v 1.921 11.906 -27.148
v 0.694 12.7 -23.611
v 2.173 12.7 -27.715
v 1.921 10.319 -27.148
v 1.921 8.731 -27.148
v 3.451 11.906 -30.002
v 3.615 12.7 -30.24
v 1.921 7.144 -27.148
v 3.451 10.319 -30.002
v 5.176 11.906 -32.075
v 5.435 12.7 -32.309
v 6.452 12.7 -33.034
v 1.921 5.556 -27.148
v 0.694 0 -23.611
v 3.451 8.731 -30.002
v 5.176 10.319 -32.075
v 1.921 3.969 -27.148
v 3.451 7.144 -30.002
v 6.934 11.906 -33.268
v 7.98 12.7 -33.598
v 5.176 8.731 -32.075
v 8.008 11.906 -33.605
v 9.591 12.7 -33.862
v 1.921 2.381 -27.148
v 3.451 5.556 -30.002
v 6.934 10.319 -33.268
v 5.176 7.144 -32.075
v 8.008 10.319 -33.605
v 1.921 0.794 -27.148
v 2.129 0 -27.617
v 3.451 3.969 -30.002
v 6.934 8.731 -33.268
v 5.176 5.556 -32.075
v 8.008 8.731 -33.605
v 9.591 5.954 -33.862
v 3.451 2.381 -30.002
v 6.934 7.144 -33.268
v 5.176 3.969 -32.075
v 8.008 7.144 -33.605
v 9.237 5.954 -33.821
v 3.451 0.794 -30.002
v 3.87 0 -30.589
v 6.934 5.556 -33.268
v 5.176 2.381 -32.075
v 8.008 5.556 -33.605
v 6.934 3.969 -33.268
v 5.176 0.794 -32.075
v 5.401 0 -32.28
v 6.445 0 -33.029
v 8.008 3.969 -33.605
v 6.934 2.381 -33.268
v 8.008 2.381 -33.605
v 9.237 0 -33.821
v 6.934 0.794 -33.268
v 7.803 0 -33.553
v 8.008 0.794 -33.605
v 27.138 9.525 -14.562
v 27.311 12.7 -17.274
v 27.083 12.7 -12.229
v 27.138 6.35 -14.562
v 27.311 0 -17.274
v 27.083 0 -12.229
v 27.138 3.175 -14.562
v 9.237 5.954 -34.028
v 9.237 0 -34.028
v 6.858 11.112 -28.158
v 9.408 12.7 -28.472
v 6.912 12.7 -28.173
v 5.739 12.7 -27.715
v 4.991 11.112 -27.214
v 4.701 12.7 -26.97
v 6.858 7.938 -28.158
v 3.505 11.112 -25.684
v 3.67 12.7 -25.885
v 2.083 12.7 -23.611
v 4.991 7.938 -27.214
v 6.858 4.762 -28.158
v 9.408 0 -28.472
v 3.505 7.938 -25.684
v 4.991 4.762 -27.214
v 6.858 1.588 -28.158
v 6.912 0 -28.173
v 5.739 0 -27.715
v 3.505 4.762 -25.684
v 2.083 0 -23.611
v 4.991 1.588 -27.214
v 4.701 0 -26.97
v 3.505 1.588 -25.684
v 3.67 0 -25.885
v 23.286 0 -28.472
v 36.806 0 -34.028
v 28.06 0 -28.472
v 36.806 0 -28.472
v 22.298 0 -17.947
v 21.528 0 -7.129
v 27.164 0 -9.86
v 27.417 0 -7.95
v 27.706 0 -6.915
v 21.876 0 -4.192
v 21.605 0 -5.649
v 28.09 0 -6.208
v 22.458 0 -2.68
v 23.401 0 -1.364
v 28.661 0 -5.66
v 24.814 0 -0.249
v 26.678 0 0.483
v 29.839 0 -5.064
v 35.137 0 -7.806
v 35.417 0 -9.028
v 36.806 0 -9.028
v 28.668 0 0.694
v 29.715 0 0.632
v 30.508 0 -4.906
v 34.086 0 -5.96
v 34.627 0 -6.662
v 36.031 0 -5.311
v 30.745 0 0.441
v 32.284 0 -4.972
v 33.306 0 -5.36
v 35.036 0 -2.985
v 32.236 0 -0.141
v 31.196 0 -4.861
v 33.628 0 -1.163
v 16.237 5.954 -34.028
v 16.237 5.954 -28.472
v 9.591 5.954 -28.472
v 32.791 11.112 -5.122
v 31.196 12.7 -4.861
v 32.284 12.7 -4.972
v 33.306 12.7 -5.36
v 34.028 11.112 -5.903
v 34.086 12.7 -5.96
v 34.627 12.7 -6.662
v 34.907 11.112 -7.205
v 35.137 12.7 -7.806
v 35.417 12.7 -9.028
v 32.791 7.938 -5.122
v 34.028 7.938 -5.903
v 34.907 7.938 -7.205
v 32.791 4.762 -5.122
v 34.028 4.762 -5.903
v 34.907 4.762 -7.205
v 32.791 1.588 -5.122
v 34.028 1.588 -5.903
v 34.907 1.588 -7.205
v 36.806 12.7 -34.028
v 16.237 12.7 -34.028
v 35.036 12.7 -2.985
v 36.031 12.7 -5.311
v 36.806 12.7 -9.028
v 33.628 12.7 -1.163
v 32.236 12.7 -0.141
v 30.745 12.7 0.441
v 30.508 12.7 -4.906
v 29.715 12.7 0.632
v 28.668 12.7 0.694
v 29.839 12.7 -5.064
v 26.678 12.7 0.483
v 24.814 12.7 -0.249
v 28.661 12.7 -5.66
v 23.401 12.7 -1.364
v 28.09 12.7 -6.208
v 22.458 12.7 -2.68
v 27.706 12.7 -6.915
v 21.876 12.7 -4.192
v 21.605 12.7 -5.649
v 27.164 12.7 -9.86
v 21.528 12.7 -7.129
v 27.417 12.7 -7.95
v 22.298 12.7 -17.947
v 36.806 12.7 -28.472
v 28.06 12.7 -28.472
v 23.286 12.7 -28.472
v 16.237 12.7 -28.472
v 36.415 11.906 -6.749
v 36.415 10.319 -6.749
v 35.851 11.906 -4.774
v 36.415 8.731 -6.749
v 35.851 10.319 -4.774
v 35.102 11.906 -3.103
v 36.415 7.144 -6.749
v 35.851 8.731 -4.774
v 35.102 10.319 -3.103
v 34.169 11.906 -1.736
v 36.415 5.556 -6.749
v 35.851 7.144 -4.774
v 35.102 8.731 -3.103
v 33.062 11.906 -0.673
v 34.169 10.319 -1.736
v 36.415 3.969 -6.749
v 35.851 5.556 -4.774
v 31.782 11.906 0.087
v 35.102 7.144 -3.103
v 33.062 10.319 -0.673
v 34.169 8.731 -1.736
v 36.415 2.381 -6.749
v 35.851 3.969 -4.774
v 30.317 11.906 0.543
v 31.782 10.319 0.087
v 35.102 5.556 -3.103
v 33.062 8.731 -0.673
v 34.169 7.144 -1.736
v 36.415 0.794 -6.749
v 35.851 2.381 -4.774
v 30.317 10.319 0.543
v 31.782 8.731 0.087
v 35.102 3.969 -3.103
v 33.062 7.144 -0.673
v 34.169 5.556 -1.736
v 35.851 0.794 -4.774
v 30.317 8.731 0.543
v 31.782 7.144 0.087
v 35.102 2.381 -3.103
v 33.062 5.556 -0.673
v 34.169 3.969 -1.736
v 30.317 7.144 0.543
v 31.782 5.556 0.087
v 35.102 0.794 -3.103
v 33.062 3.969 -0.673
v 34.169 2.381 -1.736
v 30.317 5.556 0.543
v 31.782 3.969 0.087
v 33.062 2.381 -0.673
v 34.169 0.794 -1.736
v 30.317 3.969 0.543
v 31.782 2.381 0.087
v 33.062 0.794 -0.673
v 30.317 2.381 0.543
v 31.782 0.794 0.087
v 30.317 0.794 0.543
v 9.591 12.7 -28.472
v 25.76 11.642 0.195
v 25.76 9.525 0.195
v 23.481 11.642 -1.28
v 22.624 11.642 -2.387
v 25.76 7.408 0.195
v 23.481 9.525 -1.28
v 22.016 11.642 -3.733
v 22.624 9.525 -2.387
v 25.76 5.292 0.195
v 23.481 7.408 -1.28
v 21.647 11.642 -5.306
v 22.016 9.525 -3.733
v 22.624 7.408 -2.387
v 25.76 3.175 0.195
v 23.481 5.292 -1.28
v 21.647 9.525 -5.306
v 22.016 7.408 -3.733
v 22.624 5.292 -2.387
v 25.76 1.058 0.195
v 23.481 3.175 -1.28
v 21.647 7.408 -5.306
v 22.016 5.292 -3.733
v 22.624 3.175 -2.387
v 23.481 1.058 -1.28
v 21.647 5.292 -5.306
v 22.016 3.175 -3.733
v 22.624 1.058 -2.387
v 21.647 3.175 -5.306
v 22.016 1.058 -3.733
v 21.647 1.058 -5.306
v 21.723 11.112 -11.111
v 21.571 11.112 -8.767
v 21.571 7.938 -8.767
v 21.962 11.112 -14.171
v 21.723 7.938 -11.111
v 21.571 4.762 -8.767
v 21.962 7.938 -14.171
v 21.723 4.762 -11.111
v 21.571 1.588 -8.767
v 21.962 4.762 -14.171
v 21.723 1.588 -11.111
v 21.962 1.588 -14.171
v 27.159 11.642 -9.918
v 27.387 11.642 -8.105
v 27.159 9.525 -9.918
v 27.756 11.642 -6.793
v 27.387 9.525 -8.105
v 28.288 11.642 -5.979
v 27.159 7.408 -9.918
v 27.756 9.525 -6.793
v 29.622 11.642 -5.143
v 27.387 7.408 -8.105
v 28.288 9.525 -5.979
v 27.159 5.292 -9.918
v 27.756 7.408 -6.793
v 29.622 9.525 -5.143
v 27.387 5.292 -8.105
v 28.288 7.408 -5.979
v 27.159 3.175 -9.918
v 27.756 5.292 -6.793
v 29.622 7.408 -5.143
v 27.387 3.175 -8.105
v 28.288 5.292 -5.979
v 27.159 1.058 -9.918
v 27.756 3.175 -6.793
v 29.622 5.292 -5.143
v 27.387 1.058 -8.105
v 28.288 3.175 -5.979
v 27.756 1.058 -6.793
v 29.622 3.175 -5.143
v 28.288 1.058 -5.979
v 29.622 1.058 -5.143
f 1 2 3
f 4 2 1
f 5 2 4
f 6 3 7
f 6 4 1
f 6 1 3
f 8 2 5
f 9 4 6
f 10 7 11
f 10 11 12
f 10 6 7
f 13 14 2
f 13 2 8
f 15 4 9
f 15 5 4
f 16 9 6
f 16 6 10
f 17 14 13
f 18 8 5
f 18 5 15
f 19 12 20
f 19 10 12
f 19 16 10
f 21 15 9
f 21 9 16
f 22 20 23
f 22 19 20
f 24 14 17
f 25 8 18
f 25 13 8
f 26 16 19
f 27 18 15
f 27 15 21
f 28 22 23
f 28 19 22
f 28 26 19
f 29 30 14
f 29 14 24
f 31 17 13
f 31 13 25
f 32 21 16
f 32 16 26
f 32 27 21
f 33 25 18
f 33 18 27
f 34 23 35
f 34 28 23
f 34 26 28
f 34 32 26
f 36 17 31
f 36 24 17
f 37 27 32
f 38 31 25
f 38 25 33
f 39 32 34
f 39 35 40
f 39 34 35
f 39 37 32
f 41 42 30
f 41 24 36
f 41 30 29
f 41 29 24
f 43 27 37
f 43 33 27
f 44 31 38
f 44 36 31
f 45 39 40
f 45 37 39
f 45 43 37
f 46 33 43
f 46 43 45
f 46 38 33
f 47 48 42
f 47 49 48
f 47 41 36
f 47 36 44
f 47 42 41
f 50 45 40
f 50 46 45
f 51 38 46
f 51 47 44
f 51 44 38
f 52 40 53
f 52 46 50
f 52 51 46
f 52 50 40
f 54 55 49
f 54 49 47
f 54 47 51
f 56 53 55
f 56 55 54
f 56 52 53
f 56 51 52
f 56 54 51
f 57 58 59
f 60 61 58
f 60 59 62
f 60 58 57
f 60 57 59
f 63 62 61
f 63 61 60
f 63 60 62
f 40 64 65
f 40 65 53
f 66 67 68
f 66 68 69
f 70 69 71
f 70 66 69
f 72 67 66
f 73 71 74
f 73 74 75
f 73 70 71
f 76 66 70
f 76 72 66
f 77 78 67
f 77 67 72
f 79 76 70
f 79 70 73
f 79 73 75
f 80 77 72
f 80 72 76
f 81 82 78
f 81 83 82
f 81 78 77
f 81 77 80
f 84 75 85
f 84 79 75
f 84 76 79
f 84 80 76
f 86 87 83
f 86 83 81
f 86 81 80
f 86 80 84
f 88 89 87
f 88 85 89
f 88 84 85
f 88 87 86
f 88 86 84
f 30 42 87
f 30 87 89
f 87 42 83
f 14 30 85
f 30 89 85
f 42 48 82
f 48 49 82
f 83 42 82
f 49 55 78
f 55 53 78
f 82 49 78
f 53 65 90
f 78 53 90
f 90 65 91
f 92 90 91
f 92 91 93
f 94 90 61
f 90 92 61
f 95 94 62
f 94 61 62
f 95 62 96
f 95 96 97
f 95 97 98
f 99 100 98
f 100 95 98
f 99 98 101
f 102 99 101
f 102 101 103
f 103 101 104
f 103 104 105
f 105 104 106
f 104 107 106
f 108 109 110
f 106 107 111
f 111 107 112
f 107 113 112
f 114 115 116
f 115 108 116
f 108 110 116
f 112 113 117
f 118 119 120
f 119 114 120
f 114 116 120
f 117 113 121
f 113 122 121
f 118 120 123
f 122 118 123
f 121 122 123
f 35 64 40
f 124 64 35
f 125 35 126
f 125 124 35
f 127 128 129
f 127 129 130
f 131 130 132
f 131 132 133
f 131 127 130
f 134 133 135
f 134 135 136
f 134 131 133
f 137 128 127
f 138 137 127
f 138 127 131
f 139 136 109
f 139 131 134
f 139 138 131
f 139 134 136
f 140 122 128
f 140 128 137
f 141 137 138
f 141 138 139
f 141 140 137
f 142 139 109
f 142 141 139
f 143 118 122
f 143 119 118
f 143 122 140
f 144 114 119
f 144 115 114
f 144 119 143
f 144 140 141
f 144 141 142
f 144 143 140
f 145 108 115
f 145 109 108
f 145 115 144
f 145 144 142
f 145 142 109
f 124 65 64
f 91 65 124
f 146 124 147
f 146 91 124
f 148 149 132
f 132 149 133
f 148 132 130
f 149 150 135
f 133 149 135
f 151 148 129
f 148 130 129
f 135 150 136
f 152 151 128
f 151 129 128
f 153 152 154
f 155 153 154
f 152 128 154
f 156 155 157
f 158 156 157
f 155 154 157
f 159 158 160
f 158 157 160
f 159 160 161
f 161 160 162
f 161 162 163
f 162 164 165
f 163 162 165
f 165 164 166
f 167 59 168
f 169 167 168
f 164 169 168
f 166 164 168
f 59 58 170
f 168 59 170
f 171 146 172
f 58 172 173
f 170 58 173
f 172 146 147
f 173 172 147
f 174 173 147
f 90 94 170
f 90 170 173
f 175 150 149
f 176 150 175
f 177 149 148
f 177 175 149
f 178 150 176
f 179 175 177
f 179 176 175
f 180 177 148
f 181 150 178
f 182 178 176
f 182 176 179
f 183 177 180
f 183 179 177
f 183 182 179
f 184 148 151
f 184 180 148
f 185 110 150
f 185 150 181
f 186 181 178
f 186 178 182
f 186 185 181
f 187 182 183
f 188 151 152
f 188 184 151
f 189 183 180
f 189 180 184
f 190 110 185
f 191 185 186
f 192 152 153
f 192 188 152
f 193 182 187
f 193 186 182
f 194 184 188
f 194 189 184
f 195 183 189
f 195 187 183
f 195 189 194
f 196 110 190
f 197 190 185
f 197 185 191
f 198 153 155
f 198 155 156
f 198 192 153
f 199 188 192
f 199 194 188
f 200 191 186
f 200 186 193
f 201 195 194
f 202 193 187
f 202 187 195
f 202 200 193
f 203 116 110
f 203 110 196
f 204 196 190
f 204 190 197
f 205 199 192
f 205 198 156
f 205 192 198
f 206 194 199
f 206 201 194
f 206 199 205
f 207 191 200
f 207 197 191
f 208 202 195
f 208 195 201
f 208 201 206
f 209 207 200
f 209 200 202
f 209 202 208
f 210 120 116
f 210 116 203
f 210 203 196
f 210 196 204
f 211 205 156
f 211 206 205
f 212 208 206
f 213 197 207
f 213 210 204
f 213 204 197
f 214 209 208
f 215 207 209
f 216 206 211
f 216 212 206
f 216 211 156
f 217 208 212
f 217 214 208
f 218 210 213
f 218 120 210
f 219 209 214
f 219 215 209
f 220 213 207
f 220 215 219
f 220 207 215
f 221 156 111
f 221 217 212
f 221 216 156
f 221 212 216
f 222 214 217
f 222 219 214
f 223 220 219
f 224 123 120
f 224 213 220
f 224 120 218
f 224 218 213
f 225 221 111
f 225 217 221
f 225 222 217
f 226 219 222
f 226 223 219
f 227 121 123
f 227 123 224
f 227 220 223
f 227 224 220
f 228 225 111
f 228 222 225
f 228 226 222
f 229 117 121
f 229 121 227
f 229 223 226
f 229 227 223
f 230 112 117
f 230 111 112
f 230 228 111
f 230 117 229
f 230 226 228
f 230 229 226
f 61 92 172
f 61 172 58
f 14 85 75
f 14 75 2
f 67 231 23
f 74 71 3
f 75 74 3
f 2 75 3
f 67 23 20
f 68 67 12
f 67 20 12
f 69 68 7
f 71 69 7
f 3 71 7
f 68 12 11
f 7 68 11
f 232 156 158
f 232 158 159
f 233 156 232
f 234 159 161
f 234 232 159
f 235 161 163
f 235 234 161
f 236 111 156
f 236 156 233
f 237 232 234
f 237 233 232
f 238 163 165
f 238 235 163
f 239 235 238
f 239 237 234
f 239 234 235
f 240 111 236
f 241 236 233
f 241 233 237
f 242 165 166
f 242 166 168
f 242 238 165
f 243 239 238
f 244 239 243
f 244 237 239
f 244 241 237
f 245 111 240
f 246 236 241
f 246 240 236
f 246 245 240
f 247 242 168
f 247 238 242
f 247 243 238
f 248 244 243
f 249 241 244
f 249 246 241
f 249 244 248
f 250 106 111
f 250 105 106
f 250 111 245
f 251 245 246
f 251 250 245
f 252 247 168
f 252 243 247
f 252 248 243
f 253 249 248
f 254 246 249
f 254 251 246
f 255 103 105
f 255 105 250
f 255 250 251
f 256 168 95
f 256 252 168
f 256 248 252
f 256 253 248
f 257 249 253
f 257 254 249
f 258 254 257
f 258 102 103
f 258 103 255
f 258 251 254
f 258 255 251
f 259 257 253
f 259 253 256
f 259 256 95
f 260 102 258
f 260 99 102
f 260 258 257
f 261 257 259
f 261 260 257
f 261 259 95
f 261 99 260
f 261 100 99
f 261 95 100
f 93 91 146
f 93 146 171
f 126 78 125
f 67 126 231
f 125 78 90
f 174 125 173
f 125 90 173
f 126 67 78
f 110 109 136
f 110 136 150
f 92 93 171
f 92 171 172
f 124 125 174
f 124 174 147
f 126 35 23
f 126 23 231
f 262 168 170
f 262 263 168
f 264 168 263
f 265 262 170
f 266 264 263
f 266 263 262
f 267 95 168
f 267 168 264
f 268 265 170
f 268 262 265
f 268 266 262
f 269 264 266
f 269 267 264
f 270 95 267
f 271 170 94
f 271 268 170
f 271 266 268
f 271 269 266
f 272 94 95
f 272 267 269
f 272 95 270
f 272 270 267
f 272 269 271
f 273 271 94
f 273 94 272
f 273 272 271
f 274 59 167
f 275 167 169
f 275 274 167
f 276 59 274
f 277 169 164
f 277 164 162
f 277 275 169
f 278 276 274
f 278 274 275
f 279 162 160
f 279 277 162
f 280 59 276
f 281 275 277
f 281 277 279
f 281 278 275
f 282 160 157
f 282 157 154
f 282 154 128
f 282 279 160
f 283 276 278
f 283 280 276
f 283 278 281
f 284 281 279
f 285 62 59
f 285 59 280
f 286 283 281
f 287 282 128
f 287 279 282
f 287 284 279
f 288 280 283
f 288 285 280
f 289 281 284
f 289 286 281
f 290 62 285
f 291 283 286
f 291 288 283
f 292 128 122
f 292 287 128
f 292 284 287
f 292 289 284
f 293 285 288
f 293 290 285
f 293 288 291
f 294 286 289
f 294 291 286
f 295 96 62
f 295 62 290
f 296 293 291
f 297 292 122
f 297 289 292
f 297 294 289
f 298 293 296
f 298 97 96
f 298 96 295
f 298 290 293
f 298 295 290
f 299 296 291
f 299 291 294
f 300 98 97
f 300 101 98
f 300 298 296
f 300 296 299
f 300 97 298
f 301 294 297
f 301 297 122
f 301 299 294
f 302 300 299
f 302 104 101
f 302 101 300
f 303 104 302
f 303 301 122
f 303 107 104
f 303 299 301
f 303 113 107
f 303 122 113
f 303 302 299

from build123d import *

# Parameters (mm, degrees)
BOSS_EXTRUDE1_DEPTH     = 12.7
CUT_EXTRUDE2_DEPTH      = 52.709076543
CUT_EXTRUDE2_DEPTH_BACK = 12.7
SKETCH4_W               = 5.555555556
SKETCH4_H               = 5.954243766
BOSS_EXTRUDE2_DEPTH     = 7


with BuildPart() as part:
    # Sketch2 → Boss-Extrude1 (new body)
    with BuildSketch(Plane(origin=(0, 0, 0), x_dir=(1, 0, 0), z_dir=(0, 1, 0))):
        with BuildLine():
            Line((36.805555556, 34.027777778), (36.805555556, 28.472222222))
            Line((36.805555556, 28.472222222), (28.059895833, 28.472222222))
            Line((28.059895833, 28.472222222), (27.311197917, 17.274305556))
            add(Edge.make_bspline(
                [(27.311197917, 17.274305556), (27.277795656, 16.804166639), (27.213581874, 15.900353642), (27.134284285, 14.591279231), (27.088344823, 13.379251723), (27.084956214, 12.601307574), (27.083333333, 12.228732639)],
                knots=[0, 0, 0, 0, 1.119532368, 2.152231754, 3.115062263, 4, 4, 4, 4], degree=3))
            add(Edge.make_bspline(
                [(27.083333333, 12.228732639), (27.088274581, 11.823604319), (27.097676522, 11.052747972), (27.1463749, 9.958919939), (27.245170271, 8.988755862), (27.371002693, 8.143926135), (27.529152233, 7.419430528), (27.728457334, 6.818301639), (27.97650636, 6.339464464), (28.352227221, 5.878445418), (28.902546694, 5.47047021), (29.612022333, 5.12581616), (30.381545964, 4.888099058), (30.919027092, 4.870283408), (31.195746528, 4.861111111)],
                knots=[0, 0, 0, 0, 1.508120221, 2.869569927, 4.073906796, 5.136392291, 6.047624064, 6.831039609, 7.487569696, 8.042672177, 9.031004047, 10.006413578, 10.97361213, 12, 12, 12, 12], degree=3))
            add(Edge.make_bspline(
                [(31.195746528, 4.861111111), (31.47916585, 4.872136088), (32.020929674, 4.893210634), (32.788220791, 5.094099051), (33.466107529, 5.423211567), (34.05259416, 5.891325855), (34.548953998, 6.488400226), (34.936220725, 7.22238631), (35.244986398, 8.076473761), (35.357486114, 8.699850181), (35.416666667, 9.027777778)],
                knots=[0, 0, 0, 0, 1.033647866, 1.975846305, 2.874029418, 3.767535477, 4.696297243, 5.689637366, 6.784632136, 8, 8, 8, 8], degree=3))
            Line((35.416666667, 9.027777778), (36.805555556, 9.027777778))
            add(Edge.make_bspline(
                [(36.805555556, 9.027777778), (36.751313392, 8.636593642), (36.645430641, 7.872987448), (36.430993277, 6.771079076), (36.1666915, 5.743505172), (35.873825885, 4.788096172), (35.503638642, 3.918308722), (35.126438428, 3.108890157), (34.67022236, 2.39005292), (34.190460036, 1.734735752), (33.64770155, 1.167708505), (33.078282467, 0.661363985), (32.447526517, 0.251271838), (31.785619175, -0.107880779), (31.064059185, -0.356214557), (30.308826122, -0.563500536), (29.502063403, -0.664205141), (28.949843487, -0.684214933), (28.667534722, -0.694444444)],
                knots=[0, 0, 0, 0, 1.346490984, 2.628401203, 3.824883511, 4.963792231, 6.031069444, 7.045970716, 8.004214277, 8.929182016, 9.810359102, 10.675861826, 11.520733207, 12.370272421, 13.236390006, 14.115839292, 15.03676947, 16, 16, 16, 16], degree=3))
            add(Edge.make_bspline(
                [(28.667534722, -0.694444444), (28.154682861, -0.675816782), (27.164131243, -0.639838242), (25.766335044, -0.242024901), (24.512145619, 0.369174112), (23.621609051, 1.101026149), (23.010255911, 1.797210882), (22.609852371, 2.383817061), (22.268478936, 3.030858971), (22.003101082, 3.740487332), (21.782965902, 4.501315843), (21.632459475, 5.322642072), (21.547875637, 6.204798769), (21.53462541, 6.814049436), (21.527777778, 7.12890625)],
                knots=[0, 0, 0, 0, 1.53176672, 2.958542455, 4.314758716, 5.68491526, 6.375705814, 7.084681483, 7.806528549, 8.560798466, 9.349284224, 10.175616502, 11.057170379, 12, 12, 12, 12], degree=3))
            add(Edge.make_bspline(
                [(21.527777778, 7.12890625), (21.530511411, 7.37125412), (21.536674087, 7.917600965), (21.569321673, 8.825873224), (21.639359606, 9.910585643), (21.725996598, 11.172904628), (21.834635018, 12.612456183), (21.96658957, 14.232690848), (22.114735136, 16.030968586), (22.235168036, 17.288909187), (22.298177083, 17.947048611)],
                knots=[0, 0, 0, 0, 0.536190643, 1.208783333, 2.010417809, 2.94084931, 4.00811323, 5.204264869, 6.537304937, 8, 8, 8, 8], degree=3))
            Line((22.298177083, 17.947048611), (23.285590278, 28.472222222))
            Line((23.285590278, 28.472222222), (15.277777778, 28.472222222))
            add(Edge.make_bspline(
                [(15.277777778, 28.472222222), (15.214460278, 27.401507925), (15.092072877, 25.331907254), (14.886109564, 22.340596723), (14.670777515, 19.573381685), (14.442846588, 17.030553937), (14.208342944, 14.71137929), (13.954506302, 12.617981517), (13.715610292, 10.74508508), (13.436521107, 9.086740026), (13.164846669, 7.602952782), (12.886850841, 6.270387957), (12.590238795, 5.07441313), (12.303899426, 4.011159992), (12.003972777, 3.085637953), (11.686744628, 2.301603715), (11.378814424, 1.642404725), (10.958043065, 0.964152103), (10.358101863, 0.292051075), (9.505081424, -0.285187523), (8.526340218, -0.641645855), (7.833640049, -0.676470824), (7.476128472, -0.694444444)],
                knots=[0, 0, 0, 0, 2.01044623, 3.886023449, 5.620111306, 7.212895615, 8.671360263, 9.989066837, 11.16552434, 12.209857215, 13.140654073, 13.99296191, 14.760845937, 15.449993852, 16.056713946, 16.582946555, 17.034739681, 17.418487115, 18.076100987, 18.706013306, 19.33215662, 20, 20, 20, 20], degree=3))
            add(Edge.make_bspline(
                [(7.476128472, -0.694444444), (7.207412809, -0.681627697), (6.681489385, -0.656543087), (5.927311086, -0.469815134), (5.234803565, -0.159026243), (4.623769653, 0.271526397), (4.10585267, 0.797998542), (3.737602188, 1.427988796), (3.515453468, 2.133829731), (3.486861324, 2.631486012), (3.472222222, 2.886284722)],
                knots=[0, 0, 0, 0, 1.073515936, 2.101057932, 3.084730514, 4.091615775, 5.073373561, 6.013242394, 6.982785322, 8, 8, 8, 8], degree=3))
            add(Edge.make_bspline(
                [(3.472222222, 2.886284722), (3.49977796, 3.167601475), (3.56174898, 3.800264126), (3.975195909, 4.785596558), (4.58793497, 5.912424554), (5.130000946, 6.671771181), (5.425347222, 7.085503472)],
                knots=[0, 0, 0, 0, 0.719350384, 1.617771125, 2.702035439, 4, 4, 4, 4], degree=3))
            add(Edge.make_bspline(
                [(5.425347222, 7.085503472), (5.880890291, 7.733268934), (6.778468477, 9.009592048), (7.924062056, 11.019134082), (8.912809694, 13.051591024), (9.583491505, 14.814505434), (10.052627408, 16.316401679), (10.355193153, 17.603017915), (10.666713374, 19.033013262), (10.926646603, 20.624922957), (11.194761694, 22.366552488), (11.410609585, 24.268277428), (11.637107009, 26.317618199), (11.748122743, 27.737606389), (11.805555556, 28.472222222)],
                knots=[0, 0, 0, 0, 1.256859471, 2.476450027, 3.668368903, 4.842737386, 5.467680022, 6.165560467, 6.940549266, 7.791280764, 8.726175375, 9.738470097, 10.830021485, 12, 12, 12, 12], degree=3))
            Line((11.805555556, 28.472222222), (9.407552083, 28.472222222))
            add(Edge.make_bspline(
                [(9.407552083, 28.472222222), (8.954085196, 28.460620671), (8.094301289, 28.438623856), (6.890732805, 28.196638527), (5.842130851, 27.81794011), (4.969568852, 27.229936528), (4.197964836, 26.514921386), (3.47646424, 25.663099106), (2.739413588, 24.704465568), (2.307624449, 23.984891132), (2.083333333, 23.611111111)],
                knots=[0, 0, 0, 0, 1.164670171, 2.208242094, 3.144640406, 4.011598175, 4.893941805, 5.843464191, 6.879796223, 8, 8, 8, 8], degree=3))
            Line((2.083333333, 23.611111111), (0.694444444, 23.611111111))
            add(Edge.make_bspline(
                [(0.694444444, 23.611111111), (0.877085401, 24.232597394), (1.229291, 25.431074191), (1.886266978, 27.119888333), (2.60411942, 28.642568556), (3.40397479, 29.980706486), (4.259111756, 31.115981615), (5.118517845, 32.058955597), (5.996672541, 32.785861584), (6.772590288, 33.224850634), (7.449074281, 33.455523285), (8.027104125, 33.619326955), (8.696031334, 33.743397524), (9.444623844, 33.855790163), (10.28602055, 33.921881494), (11.211287579, 33.993942488), (12.22496831, 34.020966417), (12.926797761, 34.025446099), (13.292100694, 34.027777778)],
                knots=[0, 0, 0, 0, 1.702237036, 3.282601159, 4.758360036, 6.123233304, 7.372634412, 8.489452943, 9.469553166, 10.358928799, 10.813046741, 11.345939706, 11.937066667, 12.599998432, 13.335161994, 14.154869419, 15.039607681, 16, 16, 16, 16], degree=3))
            Line((13.292100694, 34.027777778), (36.805555556, 34.027777778))
        make_face()
    extrude(amount=BOSS_EXTRUDE1_DEPTH)

    # Sketch3 → Cut-Extrude2 (cut, two sides: drawn at the far end of the back side and taken through both)
    with BuildSketch(Plane(origin=(0, 12.7, 0), x_dir=(1, 0, 0), z_dir=(0, 1, 0)).offset(-CUT_EXTRUDE2_DEPTH_BACK)):
        with BuildLine():
            Line((15.277777778, 28.472222222), (11.805555556, 28.472222222))
            add(Edge.make_bspline(
                [(11.805555556, 28.472222222), (11.748122743, 27.737606389), (11.637107009, 26.317618199), (11.410609585, 24.268277428), (11.194761694, 22.366552488), (10.926646603, 20.624922957), (10.666713374, 19.033013262), (10.355193153, 17.603017915), (10.052627408, 16.316401679), (9.583491505, 14.814505434), (8.912809694, 13.051591024), (7.924062056, 11.019134082), (6.778468477, 9.009592048), (5.880890291, 7.733268934), (5.425347222, 7.085503472)],
                knots=[0, 0, 0, 0, 0.09749821, 0.188460825, 0.272818719, 0.350726603, 0.421620894, 0.486203294, 0.544359998, 0.596438551, 0.694302591, 0.793629164, 0.895261711, 1, 1, 1, 1], degree=3))
            add(Edge.make_bspline(
                [(5.425347222, 7.085503472), (5.130000946, 6.671771181), (4.58793497, 5.912424554), (3.975195909, 4.785596558), (3.56174898, 3.800264126), (3.49977796, 3.167601475), (3.472222222, 2.886284722)],
                knots=[0, 0, 0, 0, 0.32449114, 0.595557219, 0.820162404, 1, 1, 1, 1], degree=3))
            add(Edge.make_bspline(
                [(3.472222222, 2.886284722), (3.486861324, 2.631486012), (3.515453468, 2.133829731), (3.737602188, 1.427988796), (4.10585267, 0.797998542), (4.623769653, 0.271526397), (5.234803565, -0.159026243), (5.927311086, -0.469815134), (6.681489385, -0.656543087), (7.207412809, -0.681627697), (7.476128472, -0.694444444)],
                knots=[0, 0, 0, 0, 0.127151835, 0.248344701, 0.365828305, 0.488548028, 0.614408686, 0.737367758, 0.865810508, 1, 1, 1, 1], degree=3))
            add(Edge.make_bspline(
                [(7.476128472, -0.694444444), (7.833640049, -0.676470824), (8.526340218, -0.641645855), (9.505081424, -0.285187523), (10.358101863, 0.292051075), (10.958043065, 0.964152103), (11.378814424, 1.642404725), (11.686744628, 2.301603715), (12.003972777, 3.085637953), (12.303899426, 4.011159992), (12.590238795, 5.07441313), (12.886850841, 6.270387957), (13.164846669, 7.602952782), (13.436521107, 9.086740026), (13.715610292, 10.74508508), (13.954506302, 12.617981517), (14.208342944, 14.71137929), (14.442846588, 17.030553937), (14.670777515, 19.573381685), (14.886109564, 22.340596723), (15.092072877, 25.331907254), (15.214460278, 27.401507925), (15.277777778, 28.472222222)],
                knots=[0, 0, 0, 0, 0.033392169, 0.064699335, 0.096194951, 0.129075644, 0.148263016, 0.170852672, 0.197164303, 0.227500307, 0.261957703, 0.300351905, 0.342967296, 0.389507139, 0.441723783, 0.500546658, 0.566431987, 0.639355219, 0.718994435, 0.805698828, 0.899477689, 1, 1, 1, 1], degree=3))
        make_face()
        with BuildLine():
            Line((9.591392396, 33.862133441), (9.591392396, 28.472222222))
            Line((9.591392396, 28.472222222), (11.805555556, 28.472222222))
            Line((11.805555556, 28.472222222), (15.277777778, 28.472222222))
            Line((15.277777778, 28.472222222), (16.237282416, 28.472222222))
            Line((16.237282416, 28.472222222), (16.237282416, 34.027777778))
            Line((16.237282416, 34.027777778), (13.292100694, 34.027777778))
            add(Edge.make_bspline(
                [(13.292100694, 34.027777778), (12.926797761, 34.025446099), (12.22496831, 34.020966417), (11.211287579, 33.993942488), (10.343864349, 33.926386444), (9.811849706, 33.884631797), (9.591392396, 33.862133441)],
                knots=[0, 0, 0, 0, 0.06002452, 0.115320661, 0.166552375, 0.202967967, 0.202967967, 0.202967967, 0.202967967], degree=3))
        make_face()
    extrude(amount=CUT_EXTRUDE2_DEPTH + CUT_EXTRUDE2_DEPTH_BACK, mode=Mode.SUBTRACT)


with BuildPart() as cut_extrude2_piece_1:
    # of the separate pieces the step leaves, piece 1, a body of its own (cut_extrude2_pieces)
    add(part.part.solids().sort_by_distance((36.805555556, 0, -34.027777778))[0])



with BuildPart() as cut_extrude2_piece_2:
    # of the separate pieces the step leaves, piece 2, a body of its own (cut_extrude2_pieces)
    add(part.part.solids().sort_by_distance((0.694444444, 0, -23.611111111))[0])


with BuildPart() as cut_extrude2_piece_1_1:
    add(cut_extrude2_piece_1.part)

    add(cut_extrude2_piece_2.part)  # Boss-Extrude2 merges Cut-Extrude2 piece 2
    # Sketch4 → Boss-Extrude2 (add)
    with BuildSketch(Plane.ZY.offset(-16.237282416)):
        with Locations((-31.25, 2.977121883)):
            Rectangle(SKETCH4_W, SKETCH4_H)
    extrude(amount=BOSS_EXTRUDE2_DEPTH)


solid = cut_extrude2_piece_1_1.part
